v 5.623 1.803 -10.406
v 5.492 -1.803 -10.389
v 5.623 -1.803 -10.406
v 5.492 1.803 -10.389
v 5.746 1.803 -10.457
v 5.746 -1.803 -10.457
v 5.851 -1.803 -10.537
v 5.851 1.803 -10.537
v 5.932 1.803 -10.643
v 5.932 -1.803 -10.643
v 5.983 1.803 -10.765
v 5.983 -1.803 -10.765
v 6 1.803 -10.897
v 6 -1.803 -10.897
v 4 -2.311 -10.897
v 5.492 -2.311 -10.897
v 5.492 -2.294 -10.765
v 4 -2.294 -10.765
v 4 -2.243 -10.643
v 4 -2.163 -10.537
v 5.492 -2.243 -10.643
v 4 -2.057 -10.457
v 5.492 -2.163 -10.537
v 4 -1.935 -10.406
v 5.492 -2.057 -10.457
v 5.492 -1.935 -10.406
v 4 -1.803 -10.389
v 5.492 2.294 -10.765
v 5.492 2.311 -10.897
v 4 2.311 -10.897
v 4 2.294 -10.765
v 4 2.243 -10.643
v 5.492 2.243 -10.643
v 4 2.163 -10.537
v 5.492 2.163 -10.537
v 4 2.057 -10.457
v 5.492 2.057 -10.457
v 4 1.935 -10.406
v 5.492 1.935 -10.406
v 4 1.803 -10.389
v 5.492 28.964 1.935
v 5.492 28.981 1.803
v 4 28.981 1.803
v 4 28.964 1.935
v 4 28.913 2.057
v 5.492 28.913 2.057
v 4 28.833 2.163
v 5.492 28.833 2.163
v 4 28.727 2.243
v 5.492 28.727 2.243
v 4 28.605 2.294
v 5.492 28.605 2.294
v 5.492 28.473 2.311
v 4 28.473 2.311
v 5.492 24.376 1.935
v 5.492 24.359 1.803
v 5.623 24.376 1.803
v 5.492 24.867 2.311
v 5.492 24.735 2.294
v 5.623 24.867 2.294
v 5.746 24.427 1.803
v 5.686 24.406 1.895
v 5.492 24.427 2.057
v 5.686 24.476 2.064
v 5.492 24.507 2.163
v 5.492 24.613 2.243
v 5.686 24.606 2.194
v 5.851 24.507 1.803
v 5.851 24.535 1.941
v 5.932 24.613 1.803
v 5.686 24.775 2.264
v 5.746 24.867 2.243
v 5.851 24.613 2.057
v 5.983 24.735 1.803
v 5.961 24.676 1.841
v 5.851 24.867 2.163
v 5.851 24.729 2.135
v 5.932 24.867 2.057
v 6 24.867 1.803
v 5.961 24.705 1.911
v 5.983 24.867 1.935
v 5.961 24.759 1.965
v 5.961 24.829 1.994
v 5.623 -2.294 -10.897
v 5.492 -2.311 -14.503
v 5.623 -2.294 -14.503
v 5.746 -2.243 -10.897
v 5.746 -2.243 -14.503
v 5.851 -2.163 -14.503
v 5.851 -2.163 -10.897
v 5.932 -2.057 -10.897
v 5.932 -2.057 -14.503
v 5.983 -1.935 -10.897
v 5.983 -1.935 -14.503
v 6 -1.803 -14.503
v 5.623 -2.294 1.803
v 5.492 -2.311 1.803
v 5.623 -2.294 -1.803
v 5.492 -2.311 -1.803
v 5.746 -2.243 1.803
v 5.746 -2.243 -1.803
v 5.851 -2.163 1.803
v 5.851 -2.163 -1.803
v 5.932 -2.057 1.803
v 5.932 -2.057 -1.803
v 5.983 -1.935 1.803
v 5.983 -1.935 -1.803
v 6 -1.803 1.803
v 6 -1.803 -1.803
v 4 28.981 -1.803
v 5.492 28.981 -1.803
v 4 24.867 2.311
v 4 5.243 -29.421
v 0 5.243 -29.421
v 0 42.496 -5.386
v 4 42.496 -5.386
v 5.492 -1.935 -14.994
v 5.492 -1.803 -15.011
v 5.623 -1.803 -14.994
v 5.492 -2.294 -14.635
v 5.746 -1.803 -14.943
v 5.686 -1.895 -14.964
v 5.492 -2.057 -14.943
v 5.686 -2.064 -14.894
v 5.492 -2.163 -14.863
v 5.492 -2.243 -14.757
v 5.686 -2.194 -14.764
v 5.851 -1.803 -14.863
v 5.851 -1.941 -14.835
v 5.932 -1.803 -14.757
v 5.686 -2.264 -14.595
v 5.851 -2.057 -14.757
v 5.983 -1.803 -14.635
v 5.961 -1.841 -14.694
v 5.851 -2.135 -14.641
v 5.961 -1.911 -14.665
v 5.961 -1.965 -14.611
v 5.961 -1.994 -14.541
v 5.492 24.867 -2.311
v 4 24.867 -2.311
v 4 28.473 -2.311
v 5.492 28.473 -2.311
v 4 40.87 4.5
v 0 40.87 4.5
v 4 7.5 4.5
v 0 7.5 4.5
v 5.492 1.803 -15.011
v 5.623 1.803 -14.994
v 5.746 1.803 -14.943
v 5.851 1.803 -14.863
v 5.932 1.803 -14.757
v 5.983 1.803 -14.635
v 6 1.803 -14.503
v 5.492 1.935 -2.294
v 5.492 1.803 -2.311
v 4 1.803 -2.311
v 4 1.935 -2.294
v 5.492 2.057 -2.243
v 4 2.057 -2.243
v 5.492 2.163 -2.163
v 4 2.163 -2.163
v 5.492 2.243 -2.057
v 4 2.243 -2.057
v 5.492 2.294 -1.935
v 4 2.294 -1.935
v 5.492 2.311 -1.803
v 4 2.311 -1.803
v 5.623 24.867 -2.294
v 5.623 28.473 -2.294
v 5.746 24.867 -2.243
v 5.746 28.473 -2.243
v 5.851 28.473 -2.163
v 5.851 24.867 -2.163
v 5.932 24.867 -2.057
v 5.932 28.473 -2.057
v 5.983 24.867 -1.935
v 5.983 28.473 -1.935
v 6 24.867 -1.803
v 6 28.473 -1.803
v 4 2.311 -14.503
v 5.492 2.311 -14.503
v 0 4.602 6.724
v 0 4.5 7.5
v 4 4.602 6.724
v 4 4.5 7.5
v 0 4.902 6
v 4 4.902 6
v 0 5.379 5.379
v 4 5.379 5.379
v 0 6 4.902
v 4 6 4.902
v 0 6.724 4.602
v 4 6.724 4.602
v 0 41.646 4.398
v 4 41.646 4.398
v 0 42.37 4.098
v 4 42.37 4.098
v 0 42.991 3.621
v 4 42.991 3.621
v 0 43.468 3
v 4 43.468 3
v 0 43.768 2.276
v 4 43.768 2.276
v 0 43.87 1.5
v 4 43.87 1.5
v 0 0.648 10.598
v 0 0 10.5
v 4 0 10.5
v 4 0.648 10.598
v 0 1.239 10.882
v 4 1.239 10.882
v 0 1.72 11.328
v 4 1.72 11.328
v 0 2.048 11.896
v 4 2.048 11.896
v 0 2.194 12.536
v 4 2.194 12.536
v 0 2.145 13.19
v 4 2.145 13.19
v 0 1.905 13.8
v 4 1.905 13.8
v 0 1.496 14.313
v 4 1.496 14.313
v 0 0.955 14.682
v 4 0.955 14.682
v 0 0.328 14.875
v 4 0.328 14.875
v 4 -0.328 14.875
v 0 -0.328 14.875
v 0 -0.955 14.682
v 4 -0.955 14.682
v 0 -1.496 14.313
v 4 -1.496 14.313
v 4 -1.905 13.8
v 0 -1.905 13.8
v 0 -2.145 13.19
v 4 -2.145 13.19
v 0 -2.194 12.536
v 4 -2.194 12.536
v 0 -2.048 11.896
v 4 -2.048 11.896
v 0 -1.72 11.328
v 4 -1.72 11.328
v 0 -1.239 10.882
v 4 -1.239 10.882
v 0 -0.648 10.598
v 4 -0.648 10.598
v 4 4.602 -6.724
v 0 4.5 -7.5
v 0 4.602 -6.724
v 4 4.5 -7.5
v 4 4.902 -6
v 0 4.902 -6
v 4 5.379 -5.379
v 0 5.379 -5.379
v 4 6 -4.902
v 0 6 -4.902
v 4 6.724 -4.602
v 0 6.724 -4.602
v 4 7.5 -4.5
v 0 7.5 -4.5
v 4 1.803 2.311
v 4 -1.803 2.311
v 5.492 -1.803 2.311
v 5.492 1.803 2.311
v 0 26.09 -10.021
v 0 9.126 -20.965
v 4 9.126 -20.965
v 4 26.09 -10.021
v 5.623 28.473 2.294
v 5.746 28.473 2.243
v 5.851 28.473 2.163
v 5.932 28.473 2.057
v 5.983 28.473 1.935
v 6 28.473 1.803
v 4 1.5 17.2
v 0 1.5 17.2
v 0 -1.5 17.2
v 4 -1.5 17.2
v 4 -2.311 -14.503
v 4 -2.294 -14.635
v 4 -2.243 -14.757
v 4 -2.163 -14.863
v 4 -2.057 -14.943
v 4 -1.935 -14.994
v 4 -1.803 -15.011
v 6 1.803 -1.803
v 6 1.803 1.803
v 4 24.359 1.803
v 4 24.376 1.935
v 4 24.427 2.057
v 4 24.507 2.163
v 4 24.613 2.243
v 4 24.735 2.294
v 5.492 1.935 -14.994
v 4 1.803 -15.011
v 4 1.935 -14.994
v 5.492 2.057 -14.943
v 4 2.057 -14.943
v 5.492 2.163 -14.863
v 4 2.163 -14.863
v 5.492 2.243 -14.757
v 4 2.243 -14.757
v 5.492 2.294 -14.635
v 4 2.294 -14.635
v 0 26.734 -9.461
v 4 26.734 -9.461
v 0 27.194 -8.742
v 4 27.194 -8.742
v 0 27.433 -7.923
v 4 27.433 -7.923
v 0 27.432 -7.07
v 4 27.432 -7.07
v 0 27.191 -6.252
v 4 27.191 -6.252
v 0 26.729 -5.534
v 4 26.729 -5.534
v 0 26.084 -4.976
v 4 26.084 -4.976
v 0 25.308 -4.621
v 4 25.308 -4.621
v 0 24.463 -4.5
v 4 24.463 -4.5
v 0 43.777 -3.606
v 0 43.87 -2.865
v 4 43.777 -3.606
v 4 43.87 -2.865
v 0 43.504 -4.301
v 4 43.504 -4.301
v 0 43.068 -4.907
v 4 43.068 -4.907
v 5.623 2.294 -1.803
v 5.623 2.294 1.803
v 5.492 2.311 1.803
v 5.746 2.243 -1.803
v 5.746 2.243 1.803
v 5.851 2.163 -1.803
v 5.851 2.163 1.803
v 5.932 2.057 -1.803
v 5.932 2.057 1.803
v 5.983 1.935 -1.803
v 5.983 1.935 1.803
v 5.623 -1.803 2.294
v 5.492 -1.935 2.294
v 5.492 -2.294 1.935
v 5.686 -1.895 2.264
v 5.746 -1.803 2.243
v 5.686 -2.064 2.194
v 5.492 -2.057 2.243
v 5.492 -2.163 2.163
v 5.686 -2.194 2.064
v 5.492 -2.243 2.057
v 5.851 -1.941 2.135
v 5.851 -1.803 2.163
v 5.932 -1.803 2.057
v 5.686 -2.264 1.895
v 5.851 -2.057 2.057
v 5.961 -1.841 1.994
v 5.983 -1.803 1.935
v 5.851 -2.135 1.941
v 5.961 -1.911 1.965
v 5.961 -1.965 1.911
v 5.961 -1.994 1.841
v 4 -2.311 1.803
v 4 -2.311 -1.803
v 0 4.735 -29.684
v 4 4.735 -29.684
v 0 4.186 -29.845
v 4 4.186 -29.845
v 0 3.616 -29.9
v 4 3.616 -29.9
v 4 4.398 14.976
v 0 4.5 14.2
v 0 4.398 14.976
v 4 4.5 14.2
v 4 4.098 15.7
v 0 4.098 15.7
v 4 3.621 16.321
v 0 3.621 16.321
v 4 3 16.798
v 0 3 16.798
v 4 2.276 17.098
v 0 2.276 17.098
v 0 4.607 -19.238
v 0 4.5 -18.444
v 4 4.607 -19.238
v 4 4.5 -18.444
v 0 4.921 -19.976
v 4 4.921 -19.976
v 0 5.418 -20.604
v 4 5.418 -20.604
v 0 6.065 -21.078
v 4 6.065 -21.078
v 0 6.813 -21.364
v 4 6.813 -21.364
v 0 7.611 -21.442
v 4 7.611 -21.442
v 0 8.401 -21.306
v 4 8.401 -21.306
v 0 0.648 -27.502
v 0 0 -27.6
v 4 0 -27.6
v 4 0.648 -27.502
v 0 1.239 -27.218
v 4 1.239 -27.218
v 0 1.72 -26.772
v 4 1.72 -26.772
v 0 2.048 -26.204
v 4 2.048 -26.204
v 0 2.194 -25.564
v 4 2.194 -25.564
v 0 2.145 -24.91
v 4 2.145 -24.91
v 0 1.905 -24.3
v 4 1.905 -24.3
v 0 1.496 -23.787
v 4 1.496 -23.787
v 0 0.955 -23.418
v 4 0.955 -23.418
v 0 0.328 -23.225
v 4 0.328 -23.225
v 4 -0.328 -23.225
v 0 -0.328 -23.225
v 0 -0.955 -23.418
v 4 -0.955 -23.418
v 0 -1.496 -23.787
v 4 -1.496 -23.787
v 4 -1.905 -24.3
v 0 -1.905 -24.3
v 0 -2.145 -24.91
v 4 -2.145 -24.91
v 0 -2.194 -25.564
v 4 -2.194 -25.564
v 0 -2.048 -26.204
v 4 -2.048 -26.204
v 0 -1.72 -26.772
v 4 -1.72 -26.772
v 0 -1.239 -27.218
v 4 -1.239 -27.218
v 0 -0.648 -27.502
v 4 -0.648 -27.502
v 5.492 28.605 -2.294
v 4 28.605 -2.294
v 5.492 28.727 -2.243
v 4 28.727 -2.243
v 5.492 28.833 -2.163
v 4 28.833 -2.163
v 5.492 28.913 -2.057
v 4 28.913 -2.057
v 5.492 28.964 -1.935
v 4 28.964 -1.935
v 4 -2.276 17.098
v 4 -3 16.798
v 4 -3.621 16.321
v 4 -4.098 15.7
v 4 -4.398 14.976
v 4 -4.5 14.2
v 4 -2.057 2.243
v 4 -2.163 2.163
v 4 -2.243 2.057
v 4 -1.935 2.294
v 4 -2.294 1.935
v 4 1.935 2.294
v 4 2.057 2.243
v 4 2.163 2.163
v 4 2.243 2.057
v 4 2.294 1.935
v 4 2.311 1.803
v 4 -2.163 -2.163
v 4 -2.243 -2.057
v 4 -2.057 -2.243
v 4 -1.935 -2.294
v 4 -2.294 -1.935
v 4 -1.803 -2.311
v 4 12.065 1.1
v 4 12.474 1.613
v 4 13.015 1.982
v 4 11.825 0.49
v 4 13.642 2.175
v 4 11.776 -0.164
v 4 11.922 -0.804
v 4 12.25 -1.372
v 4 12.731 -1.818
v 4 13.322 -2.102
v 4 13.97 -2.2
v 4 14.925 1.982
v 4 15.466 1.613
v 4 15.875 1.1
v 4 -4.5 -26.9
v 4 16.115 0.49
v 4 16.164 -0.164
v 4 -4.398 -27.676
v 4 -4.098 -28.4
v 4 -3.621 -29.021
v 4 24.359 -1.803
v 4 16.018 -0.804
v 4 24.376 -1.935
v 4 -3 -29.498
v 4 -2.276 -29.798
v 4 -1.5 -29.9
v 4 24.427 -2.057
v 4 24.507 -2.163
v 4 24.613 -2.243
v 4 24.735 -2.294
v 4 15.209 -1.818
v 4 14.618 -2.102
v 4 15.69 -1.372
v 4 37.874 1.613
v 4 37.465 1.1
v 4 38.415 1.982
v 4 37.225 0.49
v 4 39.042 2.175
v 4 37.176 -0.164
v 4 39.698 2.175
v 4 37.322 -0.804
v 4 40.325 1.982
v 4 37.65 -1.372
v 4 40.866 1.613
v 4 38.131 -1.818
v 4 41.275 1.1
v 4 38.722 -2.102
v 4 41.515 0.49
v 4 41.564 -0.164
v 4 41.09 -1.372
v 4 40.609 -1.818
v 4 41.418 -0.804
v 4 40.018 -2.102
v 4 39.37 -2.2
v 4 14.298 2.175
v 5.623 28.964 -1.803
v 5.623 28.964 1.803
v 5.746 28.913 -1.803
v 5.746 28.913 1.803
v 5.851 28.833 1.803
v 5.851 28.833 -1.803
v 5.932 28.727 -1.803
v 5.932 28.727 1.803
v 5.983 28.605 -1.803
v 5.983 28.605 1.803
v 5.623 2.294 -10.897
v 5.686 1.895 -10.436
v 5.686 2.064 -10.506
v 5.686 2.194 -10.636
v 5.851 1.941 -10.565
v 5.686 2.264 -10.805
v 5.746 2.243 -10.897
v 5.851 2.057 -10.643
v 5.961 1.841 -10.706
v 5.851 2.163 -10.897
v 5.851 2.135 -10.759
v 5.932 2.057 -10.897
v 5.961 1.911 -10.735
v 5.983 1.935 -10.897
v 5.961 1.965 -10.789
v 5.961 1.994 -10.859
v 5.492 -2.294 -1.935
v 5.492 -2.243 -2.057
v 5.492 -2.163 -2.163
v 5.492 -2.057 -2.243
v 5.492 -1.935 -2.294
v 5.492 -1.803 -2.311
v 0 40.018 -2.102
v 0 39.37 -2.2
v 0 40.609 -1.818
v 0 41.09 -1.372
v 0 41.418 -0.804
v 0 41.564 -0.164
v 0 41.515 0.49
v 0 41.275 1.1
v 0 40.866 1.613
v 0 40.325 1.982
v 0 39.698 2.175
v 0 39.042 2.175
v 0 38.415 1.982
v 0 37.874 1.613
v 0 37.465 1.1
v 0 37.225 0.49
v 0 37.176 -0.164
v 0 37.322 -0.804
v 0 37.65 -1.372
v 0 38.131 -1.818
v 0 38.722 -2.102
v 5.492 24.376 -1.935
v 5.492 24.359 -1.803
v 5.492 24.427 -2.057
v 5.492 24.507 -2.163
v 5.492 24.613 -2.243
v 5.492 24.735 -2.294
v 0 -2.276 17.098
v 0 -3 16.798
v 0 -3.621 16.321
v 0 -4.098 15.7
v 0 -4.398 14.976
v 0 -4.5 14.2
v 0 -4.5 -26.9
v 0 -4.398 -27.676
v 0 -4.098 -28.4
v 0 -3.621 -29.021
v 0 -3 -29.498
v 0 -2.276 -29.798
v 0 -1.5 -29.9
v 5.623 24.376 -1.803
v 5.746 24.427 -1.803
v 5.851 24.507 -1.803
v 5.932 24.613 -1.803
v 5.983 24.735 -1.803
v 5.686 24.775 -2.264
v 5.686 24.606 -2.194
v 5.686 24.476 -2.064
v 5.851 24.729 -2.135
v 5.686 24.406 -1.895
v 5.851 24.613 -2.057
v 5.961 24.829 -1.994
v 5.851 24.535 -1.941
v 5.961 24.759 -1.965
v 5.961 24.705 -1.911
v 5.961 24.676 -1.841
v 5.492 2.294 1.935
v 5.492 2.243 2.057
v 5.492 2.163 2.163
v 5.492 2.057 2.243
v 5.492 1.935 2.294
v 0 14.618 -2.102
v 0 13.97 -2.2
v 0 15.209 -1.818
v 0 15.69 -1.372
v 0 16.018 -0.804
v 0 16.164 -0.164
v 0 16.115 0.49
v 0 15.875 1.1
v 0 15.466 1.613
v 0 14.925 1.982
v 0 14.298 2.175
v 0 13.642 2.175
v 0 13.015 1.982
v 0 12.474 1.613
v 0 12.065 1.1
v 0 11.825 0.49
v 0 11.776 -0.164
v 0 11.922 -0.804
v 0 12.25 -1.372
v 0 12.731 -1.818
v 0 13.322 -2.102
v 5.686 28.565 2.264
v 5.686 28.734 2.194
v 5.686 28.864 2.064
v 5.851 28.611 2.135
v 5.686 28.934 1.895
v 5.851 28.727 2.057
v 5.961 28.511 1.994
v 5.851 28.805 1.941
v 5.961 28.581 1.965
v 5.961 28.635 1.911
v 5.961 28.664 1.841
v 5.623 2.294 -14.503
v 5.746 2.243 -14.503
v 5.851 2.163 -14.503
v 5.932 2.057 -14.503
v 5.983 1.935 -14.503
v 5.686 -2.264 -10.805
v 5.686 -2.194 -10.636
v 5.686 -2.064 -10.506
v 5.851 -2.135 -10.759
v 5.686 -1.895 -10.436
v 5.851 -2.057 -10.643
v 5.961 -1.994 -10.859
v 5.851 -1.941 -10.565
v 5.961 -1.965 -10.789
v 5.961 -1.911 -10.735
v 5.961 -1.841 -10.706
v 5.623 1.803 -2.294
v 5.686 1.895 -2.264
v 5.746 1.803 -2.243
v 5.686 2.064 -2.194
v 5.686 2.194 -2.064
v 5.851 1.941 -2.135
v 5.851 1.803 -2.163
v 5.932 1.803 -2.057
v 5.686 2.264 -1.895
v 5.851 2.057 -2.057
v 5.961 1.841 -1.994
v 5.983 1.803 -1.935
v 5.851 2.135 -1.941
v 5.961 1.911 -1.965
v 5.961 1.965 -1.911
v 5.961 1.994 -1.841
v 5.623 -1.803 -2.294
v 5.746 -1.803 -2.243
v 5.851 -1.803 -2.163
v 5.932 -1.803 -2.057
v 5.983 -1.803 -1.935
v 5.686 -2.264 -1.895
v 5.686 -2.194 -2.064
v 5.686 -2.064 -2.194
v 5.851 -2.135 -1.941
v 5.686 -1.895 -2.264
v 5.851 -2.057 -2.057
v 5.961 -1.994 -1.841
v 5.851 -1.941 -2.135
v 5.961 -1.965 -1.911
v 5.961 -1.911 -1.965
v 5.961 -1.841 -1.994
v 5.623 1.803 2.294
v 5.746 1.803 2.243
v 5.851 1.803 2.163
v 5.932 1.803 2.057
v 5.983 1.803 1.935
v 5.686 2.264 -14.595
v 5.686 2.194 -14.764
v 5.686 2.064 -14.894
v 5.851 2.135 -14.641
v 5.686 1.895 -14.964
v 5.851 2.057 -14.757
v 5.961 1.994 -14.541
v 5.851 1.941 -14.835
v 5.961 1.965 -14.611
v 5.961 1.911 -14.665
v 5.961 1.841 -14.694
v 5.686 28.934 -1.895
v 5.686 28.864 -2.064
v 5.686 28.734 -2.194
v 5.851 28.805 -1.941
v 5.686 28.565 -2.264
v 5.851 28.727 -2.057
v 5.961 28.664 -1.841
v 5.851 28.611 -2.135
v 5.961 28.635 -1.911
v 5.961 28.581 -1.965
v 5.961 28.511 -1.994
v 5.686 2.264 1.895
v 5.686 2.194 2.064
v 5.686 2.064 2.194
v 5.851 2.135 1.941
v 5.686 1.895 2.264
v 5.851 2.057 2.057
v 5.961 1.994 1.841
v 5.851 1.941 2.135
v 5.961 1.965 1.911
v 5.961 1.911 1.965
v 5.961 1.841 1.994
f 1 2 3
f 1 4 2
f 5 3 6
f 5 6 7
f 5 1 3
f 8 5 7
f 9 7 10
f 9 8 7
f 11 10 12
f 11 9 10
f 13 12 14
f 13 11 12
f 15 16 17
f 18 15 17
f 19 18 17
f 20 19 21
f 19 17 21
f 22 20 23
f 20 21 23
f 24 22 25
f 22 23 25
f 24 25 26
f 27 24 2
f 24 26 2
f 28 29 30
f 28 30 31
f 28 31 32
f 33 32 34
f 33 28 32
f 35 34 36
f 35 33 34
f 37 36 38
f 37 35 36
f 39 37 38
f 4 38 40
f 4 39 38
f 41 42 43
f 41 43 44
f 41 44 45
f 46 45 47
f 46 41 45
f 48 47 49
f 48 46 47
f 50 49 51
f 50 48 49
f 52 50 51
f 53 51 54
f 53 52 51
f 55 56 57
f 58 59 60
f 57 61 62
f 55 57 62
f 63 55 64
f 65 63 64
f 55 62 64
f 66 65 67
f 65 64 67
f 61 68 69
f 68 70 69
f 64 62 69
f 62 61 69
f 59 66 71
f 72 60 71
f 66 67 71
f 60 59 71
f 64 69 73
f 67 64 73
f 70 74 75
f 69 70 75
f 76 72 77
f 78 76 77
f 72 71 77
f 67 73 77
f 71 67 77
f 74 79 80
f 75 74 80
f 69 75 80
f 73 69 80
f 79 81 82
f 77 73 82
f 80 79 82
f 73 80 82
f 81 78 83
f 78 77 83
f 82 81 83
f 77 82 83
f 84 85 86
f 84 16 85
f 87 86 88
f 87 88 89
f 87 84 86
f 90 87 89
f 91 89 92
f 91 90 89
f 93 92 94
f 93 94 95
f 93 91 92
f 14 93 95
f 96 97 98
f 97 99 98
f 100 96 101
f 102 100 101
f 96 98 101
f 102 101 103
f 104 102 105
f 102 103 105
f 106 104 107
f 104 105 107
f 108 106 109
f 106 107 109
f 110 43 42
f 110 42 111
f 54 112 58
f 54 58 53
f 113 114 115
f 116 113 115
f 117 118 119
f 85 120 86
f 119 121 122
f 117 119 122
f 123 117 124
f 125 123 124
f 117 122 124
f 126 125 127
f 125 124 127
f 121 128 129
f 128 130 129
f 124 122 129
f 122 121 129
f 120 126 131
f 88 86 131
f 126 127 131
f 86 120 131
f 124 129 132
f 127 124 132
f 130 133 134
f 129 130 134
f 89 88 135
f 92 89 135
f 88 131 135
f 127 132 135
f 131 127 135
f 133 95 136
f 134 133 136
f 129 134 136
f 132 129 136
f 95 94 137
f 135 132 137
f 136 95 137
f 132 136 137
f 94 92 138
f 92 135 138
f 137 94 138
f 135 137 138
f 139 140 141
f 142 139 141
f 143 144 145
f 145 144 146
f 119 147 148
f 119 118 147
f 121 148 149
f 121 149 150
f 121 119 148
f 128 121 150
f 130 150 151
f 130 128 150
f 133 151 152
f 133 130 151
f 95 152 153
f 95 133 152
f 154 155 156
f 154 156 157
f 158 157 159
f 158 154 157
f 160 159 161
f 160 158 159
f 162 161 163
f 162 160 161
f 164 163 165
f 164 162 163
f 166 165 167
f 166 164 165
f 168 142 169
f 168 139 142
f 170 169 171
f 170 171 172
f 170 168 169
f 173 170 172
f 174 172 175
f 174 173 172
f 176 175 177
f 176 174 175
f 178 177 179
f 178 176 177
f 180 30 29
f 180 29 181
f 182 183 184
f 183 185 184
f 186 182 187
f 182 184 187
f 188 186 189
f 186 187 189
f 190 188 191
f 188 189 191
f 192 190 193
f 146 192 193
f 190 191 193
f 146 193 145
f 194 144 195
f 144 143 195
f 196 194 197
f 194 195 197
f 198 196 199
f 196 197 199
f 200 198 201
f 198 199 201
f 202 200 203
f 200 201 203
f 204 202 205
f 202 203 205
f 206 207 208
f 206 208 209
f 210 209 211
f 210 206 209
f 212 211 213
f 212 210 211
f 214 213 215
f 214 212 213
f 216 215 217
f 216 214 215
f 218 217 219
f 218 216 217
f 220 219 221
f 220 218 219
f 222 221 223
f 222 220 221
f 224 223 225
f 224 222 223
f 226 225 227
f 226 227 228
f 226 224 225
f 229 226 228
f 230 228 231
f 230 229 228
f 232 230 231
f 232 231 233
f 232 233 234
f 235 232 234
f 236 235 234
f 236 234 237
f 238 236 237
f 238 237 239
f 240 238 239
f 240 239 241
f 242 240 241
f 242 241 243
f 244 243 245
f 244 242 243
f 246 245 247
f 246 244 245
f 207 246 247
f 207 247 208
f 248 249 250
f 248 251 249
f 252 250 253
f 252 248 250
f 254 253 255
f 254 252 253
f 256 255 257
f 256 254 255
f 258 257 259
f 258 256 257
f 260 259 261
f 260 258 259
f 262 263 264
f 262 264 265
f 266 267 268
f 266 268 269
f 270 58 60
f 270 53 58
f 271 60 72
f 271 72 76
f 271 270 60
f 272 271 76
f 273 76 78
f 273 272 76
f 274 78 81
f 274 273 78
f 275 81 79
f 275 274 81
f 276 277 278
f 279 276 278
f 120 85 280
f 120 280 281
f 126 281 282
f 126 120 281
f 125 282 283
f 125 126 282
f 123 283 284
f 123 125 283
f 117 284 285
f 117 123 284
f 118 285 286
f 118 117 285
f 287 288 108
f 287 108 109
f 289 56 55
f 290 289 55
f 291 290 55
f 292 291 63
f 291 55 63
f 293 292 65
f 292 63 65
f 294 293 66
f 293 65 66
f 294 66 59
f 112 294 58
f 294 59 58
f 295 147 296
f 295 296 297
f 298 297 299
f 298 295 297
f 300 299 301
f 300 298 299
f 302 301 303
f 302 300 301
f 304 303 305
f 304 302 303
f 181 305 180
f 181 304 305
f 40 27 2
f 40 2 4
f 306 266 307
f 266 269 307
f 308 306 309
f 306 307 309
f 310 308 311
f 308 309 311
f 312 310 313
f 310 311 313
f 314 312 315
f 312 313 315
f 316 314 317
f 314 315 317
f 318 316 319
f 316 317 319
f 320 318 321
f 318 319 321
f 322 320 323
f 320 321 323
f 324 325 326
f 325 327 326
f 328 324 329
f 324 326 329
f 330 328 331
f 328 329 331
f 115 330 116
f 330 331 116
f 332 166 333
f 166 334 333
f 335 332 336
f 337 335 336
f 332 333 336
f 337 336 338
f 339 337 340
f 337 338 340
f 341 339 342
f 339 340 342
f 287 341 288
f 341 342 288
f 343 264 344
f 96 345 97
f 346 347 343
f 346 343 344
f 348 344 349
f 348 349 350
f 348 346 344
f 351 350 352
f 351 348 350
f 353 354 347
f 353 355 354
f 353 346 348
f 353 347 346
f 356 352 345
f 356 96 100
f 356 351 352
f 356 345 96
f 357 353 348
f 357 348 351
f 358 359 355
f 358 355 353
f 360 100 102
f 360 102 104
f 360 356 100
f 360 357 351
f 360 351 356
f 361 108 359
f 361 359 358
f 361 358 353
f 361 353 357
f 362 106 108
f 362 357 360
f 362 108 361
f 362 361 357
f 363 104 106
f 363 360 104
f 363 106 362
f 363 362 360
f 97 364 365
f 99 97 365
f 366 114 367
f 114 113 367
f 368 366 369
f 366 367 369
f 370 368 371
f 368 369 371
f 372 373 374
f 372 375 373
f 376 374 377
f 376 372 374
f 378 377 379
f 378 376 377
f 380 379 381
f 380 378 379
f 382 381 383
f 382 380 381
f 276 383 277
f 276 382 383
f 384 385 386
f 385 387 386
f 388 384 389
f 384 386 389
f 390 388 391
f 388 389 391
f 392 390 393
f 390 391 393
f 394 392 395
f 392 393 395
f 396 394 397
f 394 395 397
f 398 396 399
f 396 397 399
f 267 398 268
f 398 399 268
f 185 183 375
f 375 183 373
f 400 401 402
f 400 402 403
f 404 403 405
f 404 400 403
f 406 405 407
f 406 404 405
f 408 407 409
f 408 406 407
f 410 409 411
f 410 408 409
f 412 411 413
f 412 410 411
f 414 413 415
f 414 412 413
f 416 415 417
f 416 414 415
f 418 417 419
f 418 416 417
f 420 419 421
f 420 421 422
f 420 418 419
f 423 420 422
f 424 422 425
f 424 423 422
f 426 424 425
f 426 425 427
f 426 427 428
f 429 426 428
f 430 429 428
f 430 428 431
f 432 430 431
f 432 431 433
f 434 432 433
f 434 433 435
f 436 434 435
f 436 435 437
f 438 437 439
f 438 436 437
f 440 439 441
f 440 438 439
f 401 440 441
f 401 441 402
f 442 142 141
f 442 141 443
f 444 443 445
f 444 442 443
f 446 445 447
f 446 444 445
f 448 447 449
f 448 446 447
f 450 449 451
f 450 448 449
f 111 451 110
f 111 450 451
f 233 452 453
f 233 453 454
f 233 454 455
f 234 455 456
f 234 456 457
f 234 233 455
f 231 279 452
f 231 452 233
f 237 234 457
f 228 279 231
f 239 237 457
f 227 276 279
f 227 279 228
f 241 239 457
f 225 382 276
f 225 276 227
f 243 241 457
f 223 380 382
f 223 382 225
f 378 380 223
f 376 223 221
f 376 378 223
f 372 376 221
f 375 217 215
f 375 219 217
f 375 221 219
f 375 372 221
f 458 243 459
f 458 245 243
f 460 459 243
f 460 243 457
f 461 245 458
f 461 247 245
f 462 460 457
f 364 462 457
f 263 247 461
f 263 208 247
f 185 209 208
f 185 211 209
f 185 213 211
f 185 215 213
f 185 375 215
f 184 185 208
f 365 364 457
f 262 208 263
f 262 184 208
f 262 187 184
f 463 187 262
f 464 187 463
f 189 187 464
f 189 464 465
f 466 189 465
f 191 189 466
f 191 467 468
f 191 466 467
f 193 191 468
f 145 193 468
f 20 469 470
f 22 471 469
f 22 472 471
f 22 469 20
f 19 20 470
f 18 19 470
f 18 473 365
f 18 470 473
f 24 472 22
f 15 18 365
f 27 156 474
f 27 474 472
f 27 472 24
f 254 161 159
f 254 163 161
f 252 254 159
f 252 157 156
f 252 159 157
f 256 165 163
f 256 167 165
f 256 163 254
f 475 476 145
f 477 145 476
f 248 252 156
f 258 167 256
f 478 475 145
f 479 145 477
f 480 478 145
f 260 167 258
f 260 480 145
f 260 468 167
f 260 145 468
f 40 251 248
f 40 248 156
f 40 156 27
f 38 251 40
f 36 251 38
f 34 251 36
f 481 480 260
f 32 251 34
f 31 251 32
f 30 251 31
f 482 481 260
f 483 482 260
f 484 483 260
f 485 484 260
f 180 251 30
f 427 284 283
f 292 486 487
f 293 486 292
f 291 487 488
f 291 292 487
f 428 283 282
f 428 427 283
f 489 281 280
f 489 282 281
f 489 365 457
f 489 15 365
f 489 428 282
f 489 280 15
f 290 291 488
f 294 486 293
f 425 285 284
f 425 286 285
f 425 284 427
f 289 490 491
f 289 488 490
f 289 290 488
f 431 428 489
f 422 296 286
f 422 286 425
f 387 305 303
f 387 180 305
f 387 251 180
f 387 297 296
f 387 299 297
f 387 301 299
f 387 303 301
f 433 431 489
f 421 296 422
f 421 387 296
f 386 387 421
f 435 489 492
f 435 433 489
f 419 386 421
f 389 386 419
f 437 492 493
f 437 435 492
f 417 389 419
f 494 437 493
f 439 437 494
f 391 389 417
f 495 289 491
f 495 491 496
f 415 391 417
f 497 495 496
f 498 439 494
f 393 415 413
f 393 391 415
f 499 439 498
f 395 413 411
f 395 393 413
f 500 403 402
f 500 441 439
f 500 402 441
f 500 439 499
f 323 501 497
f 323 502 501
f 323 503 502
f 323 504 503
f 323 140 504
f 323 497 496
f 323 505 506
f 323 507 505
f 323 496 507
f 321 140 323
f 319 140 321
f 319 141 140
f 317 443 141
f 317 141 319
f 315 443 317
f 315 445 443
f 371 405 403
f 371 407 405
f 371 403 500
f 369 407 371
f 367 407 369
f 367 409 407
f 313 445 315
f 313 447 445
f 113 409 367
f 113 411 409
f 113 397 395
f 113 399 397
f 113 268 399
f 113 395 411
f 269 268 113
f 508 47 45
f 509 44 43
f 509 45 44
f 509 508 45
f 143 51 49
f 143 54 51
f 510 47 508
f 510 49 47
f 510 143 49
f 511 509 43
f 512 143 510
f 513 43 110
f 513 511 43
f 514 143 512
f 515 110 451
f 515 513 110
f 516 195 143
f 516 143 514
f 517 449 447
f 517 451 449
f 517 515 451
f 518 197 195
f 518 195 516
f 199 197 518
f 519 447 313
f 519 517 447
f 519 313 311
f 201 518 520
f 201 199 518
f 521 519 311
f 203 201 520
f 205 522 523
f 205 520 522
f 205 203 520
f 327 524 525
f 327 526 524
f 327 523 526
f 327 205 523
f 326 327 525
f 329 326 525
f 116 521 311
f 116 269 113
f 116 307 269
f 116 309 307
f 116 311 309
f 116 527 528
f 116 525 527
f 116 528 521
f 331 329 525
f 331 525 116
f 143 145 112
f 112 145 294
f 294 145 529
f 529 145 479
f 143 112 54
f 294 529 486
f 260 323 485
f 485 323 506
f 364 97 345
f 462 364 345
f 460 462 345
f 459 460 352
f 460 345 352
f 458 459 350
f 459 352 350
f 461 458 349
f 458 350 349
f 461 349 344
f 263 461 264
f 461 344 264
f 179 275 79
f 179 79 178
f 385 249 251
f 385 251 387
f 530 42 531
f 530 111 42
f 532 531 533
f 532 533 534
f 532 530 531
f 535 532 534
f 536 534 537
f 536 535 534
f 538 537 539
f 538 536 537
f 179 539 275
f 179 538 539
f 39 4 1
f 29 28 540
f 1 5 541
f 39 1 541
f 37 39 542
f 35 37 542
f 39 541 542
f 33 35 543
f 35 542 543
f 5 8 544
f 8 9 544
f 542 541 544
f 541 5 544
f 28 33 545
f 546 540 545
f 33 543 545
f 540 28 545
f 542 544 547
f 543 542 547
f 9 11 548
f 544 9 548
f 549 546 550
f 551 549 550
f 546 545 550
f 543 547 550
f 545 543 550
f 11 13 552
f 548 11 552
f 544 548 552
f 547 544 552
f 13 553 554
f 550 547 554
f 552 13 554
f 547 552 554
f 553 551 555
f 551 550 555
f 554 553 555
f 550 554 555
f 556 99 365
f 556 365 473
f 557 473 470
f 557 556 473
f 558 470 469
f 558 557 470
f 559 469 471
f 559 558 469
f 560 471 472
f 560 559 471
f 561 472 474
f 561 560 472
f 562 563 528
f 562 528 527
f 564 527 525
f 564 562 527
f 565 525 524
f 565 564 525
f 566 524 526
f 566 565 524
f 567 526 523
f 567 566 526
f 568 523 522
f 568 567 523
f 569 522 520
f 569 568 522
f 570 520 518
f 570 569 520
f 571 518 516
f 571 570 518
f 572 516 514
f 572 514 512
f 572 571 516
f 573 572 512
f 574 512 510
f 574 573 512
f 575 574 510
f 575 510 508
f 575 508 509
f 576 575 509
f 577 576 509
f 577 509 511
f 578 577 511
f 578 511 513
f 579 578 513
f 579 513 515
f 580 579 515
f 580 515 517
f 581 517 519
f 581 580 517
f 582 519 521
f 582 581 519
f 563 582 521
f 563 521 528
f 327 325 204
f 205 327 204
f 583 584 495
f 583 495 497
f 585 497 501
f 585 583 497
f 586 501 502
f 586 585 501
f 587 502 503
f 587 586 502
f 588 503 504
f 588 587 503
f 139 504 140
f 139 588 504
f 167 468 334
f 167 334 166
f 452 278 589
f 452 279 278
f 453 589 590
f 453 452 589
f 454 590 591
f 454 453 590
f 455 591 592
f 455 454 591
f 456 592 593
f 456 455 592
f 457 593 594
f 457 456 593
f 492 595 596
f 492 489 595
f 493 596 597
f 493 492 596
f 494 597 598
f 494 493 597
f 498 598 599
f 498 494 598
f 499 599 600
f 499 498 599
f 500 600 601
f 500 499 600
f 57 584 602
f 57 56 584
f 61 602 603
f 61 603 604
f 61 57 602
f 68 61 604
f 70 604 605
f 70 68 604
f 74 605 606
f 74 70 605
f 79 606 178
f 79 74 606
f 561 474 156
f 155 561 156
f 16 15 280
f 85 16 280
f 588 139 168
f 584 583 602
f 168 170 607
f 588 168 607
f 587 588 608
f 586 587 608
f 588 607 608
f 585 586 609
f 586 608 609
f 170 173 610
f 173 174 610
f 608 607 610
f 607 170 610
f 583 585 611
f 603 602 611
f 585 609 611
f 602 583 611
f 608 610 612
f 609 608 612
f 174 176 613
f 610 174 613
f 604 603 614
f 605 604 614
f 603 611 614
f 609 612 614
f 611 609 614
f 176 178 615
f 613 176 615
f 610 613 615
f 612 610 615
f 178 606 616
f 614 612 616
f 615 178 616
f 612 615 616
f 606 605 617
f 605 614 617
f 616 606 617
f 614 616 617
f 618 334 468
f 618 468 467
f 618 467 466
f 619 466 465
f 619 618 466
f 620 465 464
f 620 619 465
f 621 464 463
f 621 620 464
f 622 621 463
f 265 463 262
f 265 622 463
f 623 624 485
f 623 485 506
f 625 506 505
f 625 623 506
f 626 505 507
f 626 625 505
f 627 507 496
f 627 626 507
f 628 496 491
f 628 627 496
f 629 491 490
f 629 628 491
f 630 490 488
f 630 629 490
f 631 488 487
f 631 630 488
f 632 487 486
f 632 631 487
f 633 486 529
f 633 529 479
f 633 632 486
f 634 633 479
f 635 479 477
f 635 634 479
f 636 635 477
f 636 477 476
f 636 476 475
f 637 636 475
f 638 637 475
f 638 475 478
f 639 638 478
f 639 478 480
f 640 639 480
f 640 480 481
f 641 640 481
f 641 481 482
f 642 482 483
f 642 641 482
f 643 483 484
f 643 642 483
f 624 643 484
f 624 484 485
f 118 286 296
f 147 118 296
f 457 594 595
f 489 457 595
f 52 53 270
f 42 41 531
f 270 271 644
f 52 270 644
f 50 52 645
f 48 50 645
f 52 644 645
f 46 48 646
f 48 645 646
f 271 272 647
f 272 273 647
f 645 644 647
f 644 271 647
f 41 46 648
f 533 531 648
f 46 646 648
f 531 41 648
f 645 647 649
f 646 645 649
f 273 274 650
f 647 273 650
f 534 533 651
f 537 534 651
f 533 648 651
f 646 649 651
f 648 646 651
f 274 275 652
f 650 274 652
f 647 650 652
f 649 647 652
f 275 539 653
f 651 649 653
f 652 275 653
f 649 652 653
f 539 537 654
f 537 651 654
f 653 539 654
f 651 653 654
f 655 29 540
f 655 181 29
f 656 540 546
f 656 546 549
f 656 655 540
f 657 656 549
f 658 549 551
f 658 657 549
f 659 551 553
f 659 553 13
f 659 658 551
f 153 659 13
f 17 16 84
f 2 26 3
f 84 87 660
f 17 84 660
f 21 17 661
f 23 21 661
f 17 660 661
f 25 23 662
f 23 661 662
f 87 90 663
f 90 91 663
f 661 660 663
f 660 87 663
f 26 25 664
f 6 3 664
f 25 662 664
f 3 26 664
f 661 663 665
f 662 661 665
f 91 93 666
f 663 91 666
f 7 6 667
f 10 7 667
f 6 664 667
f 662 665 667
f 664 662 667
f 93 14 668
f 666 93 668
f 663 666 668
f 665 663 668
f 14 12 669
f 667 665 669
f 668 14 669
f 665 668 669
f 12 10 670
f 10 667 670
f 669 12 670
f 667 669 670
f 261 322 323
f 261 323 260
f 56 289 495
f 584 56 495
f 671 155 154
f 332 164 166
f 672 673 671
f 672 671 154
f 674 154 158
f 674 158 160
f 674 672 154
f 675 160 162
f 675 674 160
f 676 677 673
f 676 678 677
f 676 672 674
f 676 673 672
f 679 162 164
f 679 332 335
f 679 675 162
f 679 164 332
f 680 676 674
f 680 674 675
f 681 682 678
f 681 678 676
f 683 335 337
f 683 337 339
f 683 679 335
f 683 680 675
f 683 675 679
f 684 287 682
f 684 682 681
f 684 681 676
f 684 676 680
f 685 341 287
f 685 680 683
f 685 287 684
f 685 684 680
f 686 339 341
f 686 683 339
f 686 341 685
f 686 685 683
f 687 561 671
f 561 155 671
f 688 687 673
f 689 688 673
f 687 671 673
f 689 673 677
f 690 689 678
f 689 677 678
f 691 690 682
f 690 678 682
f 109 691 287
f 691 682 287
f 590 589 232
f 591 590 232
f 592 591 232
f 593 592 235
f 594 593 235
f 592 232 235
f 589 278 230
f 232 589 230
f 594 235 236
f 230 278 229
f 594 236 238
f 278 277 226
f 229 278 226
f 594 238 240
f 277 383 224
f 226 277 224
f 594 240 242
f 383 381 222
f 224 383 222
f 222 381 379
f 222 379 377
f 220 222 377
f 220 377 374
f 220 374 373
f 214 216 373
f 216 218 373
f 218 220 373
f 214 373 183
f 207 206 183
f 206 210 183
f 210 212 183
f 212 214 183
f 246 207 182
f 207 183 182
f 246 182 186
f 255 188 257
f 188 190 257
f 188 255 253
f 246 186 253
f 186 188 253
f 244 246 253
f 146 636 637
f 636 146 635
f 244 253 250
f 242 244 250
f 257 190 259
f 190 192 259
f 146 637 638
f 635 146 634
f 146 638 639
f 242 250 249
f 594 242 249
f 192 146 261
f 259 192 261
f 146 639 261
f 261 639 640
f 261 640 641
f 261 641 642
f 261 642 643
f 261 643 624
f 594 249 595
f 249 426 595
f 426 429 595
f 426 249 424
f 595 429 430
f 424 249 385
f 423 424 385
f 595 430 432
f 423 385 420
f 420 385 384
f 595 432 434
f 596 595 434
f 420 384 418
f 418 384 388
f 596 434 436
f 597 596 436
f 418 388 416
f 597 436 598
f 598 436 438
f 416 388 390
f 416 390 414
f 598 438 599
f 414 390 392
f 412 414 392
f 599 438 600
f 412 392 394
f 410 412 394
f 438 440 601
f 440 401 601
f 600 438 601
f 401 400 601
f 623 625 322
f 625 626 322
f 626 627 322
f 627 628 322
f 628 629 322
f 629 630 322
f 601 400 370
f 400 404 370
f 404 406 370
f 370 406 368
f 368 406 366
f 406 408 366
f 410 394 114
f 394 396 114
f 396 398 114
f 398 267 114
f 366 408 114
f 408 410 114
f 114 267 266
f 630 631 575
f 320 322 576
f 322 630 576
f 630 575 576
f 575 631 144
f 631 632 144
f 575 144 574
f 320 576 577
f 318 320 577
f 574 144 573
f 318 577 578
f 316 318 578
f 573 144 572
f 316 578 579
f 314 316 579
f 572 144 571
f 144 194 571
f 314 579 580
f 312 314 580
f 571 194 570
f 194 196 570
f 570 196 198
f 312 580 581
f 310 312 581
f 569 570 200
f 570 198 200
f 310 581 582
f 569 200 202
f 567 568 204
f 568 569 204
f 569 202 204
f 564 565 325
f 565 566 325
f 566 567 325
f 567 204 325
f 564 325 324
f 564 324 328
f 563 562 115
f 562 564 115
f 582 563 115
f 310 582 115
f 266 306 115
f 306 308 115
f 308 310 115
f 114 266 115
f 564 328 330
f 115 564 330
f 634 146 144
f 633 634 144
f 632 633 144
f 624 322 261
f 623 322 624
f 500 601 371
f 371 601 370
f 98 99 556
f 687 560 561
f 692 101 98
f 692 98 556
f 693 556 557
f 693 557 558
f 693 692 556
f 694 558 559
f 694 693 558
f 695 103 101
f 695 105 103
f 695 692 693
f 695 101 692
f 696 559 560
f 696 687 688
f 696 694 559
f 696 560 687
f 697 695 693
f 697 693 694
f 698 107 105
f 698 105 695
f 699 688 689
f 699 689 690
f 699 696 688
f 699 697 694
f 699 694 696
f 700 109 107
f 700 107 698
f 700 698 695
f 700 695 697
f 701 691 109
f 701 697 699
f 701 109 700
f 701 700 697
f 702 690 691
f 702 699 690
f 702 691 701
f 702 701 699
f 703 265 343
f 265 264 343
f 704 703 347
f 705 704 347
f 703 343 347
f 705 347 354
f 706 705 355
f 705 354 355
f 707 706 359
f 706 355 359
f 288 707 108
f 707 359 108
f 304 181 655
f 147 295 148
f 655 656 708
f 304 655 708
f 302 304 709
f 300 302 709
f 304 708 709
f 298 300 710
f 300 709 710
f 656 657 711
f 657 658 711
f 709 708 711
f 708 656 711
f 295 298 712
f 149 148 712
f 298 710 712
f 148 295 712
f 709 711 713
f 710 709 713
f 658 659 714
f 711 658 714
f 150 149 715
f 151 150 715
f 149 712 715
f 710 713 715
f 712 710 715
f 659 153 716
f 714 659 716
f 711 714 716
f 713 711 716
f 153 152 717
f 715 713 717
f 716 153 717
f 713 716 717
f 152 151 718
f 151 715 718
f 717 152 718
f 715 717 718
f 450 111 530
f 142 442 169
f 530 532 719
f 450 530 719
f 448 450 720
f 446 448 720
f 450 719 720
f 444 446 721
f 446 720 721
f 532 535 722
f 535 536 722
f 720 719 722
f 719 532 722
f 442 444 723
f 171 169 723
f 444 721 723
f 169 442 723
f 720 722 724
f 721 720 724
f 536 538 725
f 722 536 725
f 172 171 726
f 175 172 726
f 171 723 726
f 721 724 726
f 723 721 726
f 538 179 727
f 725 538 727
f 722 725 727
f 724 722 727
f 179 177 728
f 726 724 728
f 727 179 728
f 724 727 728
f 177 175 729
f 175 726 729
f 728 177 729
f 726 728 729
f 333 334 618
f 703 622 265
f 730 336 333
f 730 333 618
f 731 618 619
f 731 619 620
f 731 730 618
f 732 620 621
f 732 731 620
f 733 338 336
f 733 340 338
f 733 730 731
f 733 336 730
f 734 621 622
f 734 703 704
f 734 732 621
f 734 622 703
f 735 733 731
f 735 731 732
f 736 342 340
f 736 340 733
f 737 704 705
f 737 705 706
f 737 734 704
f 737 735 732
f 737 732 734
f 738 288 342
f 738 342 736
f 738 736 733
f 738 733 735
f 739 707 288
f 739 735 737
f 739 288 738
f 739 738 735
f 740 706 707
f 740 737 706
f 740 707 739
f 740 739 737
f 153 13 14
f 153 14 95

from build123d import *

# Parameters (mm, degrees)
SKETCH1_R           = 2.2
BOSS_EXTRUDE1_DEPTH = 4
FILLET1_R           = 3
SKETCH2_W           = 4.6228
SKETCH2_H           = 4.6228
BOSS_EXTRUDE2_DEPTH = 2
FILLET2_R           = 0.508
FILLET3_R           = 0.508


with BuildPart() as part:
    # Sketch1 → Boss-Extrude1 (new body)
    with BuildSketch(Plane(origin=(0, 0, 0), x_dir=(0, 0, -1), z_dir=(1, 0, 0))):
        Polygon((-4.5, 4.5), (-17.2, 4.5), (-17.2, -4.5), (29.9, -4.5), (29.9, 4.5), (4.5, 43.87), (-4.5, 43.87), align=None)
        with Locations((25.4, 0)):
            Circle(SKETCH1_R, mode=Mode.SUBTRACT)
        with Locations((0, 13.97)):
            Circle(SKETCH1_R, mode=Mode.SUBTRACT)
        with Locations((0, 39.37)):
            Circle(SKETCH1_R, mode=Mode.SUBTRACT)
        with Locations((-12.7, 0)):
            Circle(SKETCH1_R, mode=Mode.SUBTRACT)
        Polygon((4.5, 4.5), (23.949720405, 4.5), (4.5, 34.647066627), align=None, mode=Mode.SUBTRACT)
    extrude(amount=BOSS_EXTRUDE1_DEPTH)

    # Fillet1
    fillet1_edges = [part.edges().sort_by_distance(p)[0] for p in [
        (2, 43.87, 4.5),
        (2, 43.87, -4.5),
        (2, 4.5, -29.9),
        (2, -4.5, -29.9),
        (2, -4.5, 17.2),
        (2, 4.5, 17.2),
        (2, 4.5, 4.5),
        (2, 34.647066627, -4.5),
        (2, 4.5, -4.5),
        (2, 4.5, -23.949720405),
    ]]
    fillet(fillet1_edges, radius=FILLET1_R)

    # Sketch2 → Boss-Extrude2 (add)
    with BuildSketch(Plane(origin=(4, 0, 0), x_dir=(0, 0, -1), z_dir=(1, 0, 0))):
        Rectangle(SKETCH2_W, SKETCH2_H)
        with Locations((12.7, 0)):
            Rectangle(SKETCH2_W, SKETCH2_H)
        with Locations((0, 26.67)):
            Rectangle(SKETCH2_W, SKETCH2_H)
    extrude(amount=BOSS_EXTRUDE2_DEPTH)

    # Fillet2
    fillet2_edges = [part.edges().sort_by_distance(p)[0] for p in [
        (5, 2.3114, 2.3114),
        (5, -2.3114, 2.3114),
        (5, -2.3114, -2.3114),
        (5, 2.3114, -2.3114),
        (5, 2.3114, -10.3886),
        (5, -2.3114, -10.3886),
        (5, -2.3114, -15.0114),
        (5, 2.3114, -15.0114),
        (5, 24.3586, -2.3114),
        (5, 28.9814, -2.3114),
        (5, 28.9814, 2.3114),
        (5, 24.3586, 2.3114),
    ]]
    fillet(fillet2_edges, radius=FILLET2_R)

    # Fillet3
    fillet3_edges = [part.edges().sort_by_distance(p)[0] for p in [
        (6, 2.3114, -12.7),
        (6, 0, -15.0114),
        (6, 0, -10.3886),
        (6, -2.3114, -12.7),
        (6, -2.162610245, -14.862610245),
        (6, -2.162610245, -10.537389755),
        (6, 2.162610245, -10.537389755),
        (6, 2.162610245, -14.862610245),
        (6, 0, -2.3114),
        (6, -2.3114, 0),
        (6, 0, 2.3114),
        (6, 2.3114, 0),
        (6, -2.162610245, 2.162610245),
        (6, 2.162610245, 2.162610245),
        (6, 2.162610245, -2.162610245),
        (6, -2.162610245, -2.162610245),
        (6, 26.67, 2.3114),
        (6, 28.9814, 0),
        (6, 26.67, -2.3114),
        (6, 24.3586, 0),
        (6, 24.507389755, 2.162610245),
        (6, 24.507389755, -2.162610245),
        (6, 28.832610245, -2.162610245),
        (6, 28.832610245, 2.162610245),
    ]]
    fillet(fillet3_edges, radius=FILLET3_R)


solid = part.part
